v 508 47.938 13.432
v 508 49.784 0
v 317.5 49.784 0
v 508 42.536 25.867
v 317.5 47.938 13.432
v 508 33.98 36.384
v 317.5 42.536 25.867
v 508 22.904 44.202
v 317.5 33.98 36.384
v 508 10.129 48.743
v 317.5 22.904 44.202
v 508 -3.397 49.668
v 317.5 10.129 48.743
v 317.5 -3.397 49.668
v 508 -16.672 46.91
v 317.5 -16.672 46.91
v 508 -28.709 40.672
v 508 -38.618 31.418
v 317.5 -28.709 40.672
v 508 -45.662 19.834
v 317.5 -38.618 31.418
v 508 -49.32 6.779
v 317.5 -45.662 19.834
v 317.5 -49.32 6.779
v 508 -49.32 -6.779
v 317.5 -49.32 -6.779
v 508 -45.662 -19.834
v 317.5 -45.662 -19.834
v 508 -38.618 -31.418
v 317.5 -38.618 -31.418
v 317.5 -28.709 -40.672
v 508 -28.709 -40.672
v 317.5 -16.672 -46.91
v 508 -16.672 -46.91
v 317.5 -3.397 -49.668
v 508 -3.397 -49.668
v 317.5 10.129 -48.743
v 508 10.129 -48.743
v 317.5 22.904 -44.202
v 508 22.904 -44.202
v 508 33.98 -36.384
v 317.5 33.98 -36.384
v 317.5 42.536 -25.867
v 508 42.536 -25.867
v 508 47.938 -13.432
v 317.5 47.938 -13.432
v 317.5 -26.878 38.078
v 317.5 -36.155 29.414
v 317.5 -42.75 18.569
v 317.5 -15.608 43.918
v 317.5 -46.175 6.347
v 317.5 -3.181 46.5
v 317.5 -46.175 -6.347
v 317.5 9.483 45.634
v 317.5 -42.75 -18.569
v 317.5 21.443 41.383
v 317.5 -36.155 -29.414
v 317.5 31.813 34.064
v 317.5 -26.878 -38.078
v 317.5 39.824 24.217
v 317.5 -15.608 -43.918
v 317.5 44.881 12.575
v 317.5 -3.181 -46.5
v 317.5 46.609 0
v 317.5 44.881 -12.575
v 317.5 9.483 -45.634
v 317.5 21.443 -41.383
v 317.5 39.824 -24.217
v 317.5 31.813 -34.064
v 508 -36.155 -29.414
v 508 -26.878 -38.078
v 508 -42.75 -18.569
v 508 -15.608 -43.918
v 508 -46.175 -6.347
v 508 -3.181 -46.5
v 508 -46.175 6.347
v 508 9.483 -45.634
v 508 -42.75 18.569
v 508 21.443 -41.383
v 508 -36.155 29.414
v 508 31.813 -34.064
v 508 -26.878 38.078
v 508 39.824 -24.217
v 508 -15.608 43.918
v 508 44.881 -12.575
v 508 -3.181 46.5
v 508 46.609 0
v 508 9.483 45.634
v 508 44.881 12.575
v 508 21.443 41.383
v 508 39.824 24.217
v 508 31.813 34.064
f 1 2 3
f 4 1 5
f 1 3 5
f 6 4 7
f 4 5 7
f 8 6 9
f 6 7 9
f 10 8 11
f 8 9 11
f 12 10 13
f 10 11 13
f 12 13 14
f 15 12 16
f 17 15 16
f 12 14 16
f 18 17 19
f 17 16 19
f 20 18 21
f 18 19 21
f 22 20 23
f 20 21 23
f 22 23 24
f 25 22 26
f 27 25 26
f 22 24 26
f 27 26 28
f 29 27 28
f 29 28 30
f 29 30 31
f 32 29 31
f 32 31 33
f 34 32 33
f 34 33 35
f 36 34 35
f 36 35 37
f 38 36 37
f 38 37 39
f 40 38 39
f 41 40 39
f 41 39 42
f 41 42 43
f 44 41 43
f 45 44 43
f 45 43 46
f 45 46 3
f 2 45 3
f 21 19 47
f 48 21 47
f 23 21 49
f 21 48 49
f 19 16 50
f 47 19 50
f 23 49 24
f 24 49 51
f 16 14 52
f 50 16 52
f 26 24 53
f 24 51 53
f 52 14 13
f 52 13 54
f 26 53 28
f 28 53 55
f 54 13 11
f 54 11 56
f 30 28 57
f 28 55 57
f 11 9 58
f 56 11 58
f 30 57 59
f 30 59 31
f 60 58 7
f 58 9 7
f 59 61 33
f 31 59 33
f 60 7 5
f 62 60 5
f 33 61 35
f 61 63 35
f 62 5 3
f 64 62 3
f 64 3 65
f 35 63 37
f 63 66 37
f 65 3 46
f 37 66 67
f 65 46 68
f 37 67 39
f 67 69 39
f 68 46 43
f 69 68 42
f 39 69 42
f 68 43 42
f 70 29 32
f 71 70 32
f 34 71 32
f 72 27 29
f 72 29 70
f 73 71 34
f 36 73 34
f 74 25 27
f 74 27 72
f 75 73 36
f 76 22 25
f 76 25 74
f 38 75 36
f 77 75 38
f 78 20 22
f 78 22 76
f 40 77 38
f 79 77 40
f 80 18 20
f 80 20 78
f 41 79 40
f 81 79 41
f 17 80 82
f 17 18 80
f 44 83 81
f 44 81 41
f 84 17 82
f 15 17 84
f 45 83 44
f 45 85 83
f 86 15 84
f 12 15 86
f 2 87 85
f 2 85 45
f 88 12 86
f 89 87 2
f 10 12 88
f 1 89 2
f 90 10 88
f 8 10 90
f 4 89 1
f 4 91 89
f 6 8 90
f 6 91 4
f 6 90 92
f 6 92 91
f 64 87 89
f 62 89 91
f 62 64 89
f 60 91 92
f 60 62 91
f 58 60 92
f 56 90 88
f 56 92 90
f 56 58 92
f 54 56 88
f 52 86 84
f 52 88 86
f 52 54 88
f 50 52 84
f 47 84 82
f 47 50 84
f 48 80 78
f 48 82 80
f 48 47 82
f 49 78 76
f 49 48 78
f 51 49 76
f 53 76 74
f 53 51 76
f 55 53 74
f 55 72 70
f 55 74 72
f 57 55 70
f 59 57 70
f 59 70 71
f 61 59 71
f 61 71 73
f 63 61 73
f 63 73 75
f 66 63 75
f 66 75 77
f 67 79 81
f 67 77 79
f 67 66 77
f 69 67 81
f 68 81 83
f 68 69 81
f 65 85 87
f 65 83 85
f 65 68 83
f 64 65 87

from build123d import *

# Parameters (mm, degrees)
SKETCH2_R           = 49.784
BOSS_EXTRUDE1_DEPTH = 203.2
SKETCH3_R           = 11.74839717
BOSS_EXTRUDE2_DEPTH = 50.8
SKETCH4_R           = 53.885165976
CUT_EXTRUDE1_DEPTH  = 375.969043164
SHELL1_T            = -3.175


with BuildPart() as part:
    # Sketch1 → Revolve1 (revolve)
    with BuildSketch(Plane.XY):
        with BuildLine():
            Line((304.8, 49.784), (304.8, 0))
            Line((304.8, 0), (0, 0))
            Line((0, 0), (0, 11.748397173))
            add(Edge.make_bspline(
                [(0, 11.748397173), (0.424160675, 11.855932678), (1.277768006, 12.07173392), (3.085410505, 12.527272667), (5.106222596, 13.032281093), (7.110128552, 13.529344024), (9.159948224, 14.034387922), (11.195444228, 14.532141119), (13.233412884, 15.026861964), (15.805049223, 15.64653599), (18.91026091, 16.387291474), (22.550652523, 17.244690048), (26.727238439, 18.213147263), (31.952168035, 19.405675489), (42.412897925, 21.742539102), (62.333903875, 25.976370199), (110.770450737, 35.225121195), (160.70732909, 42.159920913), (207.702302928, 46.434962608), (245.168015054, 48.368183749), (253.734807707, 48.740972714), (260.161369668, 48.98354131), (264.446272339, 49.130442523), (268.731666265, 49.262530797), (273.017475857, 49.379804553), (277.303691578, 49.48226239), (281.590188304, 49.569903083), (285.329649653, 49.633426545), (288.521672796, 49.67849525), (291.166731437, 49.70980578), (293.263778354, 49.731088433), (295.359186858, 49.74882407), (297.470177021, 49.76301264), (299.535126271, 49.773654103), (301.617177871, 49.780748429), (303.482211221, 49.783408805), (304.362420109, 49.784), (304.8, 49.784)],
                knots=[0.082917815, 0.082917815, 0.082917815, 0.082917815, 0.082917815, 0.088601511, 0.094285207, 0.099968902, 0.105652598, 0.111336294, 0.11701999, 0.122703686, 0.128387381, 0.140005218, 0.151623054, 0.16324089, 0.174858727, 0.198094396, 0.267801409, 0.383979763, 0.709279153, 0.744132659, 0.778986165, 0.790604, 0.802221836, 0.813839671, 0.825457507, 0.837075342, 0.848693177, 0.860311013, 0.871928848, 0.877612544, 0.883296239, 0.888979935, 0.89466363, 0.900347326, 0.906031021, 0.911714717, 0.917398412, 0.917398412, 0.917398412, 0.917398412, 0.917398412], degree=4))
        make_face()
    revolve(axis=Axis((304.8, 0, 0), (-1, 0, 0)))

    # Sketch2 → Boss-Extrude1 (add)
    with BuildSketch(Plane(origin=(304.8, 0, 0), x_dir=(0, 0, -1), z_dir=(1, 0, 0))):
        with Locations(Location((0, 0, 0), (0, 0, 90))):
            Circle(SKETCH2_R)
    extrude(amount=BOSS_EXTRUDE1_DEPTH)

    # Sketch3 → Boss-Extrude2 (add)
    with BuildSketch(Plane.ZY):
        with Locations(Location((0, 0, 0), (0, 0, 270))):
            Circle(SKETCH3_R)
    extrude(amount=BOSS_EXTRUDE2_DEPTH)

    # Sketch4 → Cut-Extrude1 (cut, through all)
    with BuildSketch(Plane(origin=(317.5, 0, 0), x_dir=(0, 0, -1), z_dir=(1, 0, 0))):
        Circle(SKETCH4_R)
    extrude(amount=-CUT_EXTRUDE1_DEPTH, mode=Mode.SUBTRACT)

    # Shell1
    shell1_openings = [part.faces().sort_by_distance(p)[0] for p in [
        (508, 0, 0),
        (317.5, 0, 0),
    ]]
    offset(amount=SHELL1_T, openings=shell1_openings, kind=Kind.INTERSECTION)


solid = part.part
